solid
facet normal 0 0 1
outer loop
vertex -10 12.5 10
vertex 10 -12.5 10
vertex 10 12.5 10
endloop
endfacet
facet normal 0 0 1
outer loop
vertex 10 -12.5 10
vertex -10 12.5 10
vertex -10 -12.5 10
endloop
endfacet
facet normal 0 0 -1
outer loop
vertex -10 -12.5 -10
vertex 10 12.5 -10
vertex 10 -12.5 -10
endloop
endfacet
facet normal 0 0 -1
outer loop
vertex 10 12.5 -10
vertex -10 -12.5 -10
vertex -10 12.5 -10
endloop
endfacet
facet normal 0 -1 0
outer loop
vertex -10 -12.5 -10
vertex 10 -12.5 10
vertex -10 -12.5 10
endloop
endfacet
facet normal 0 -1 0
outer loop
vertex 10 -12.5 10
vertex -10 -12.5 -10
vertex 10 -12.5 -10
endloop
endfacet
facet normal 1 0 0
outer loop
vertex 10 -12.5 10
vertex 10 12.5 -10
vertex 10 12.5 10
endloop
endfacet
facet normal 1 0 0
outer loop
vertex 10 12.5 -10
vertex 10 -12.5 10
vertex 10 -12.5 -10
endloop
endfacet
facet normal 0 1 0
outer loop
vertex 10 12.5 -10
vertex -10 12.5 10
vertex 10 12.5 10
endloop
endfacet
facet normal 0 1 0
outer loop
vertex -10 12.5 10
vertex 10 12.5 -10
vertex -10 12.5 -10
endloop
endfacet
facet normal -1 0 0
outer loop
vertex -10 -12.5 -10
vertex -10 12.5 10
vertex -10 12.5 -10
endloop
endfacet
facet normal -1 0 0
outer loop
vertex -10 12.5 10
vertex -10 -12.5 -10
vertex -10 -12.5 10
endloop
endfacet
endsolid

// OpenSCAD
// Generated by generate_scads.py
union() {
  cube(size=[20,25,20], center=true);
}
